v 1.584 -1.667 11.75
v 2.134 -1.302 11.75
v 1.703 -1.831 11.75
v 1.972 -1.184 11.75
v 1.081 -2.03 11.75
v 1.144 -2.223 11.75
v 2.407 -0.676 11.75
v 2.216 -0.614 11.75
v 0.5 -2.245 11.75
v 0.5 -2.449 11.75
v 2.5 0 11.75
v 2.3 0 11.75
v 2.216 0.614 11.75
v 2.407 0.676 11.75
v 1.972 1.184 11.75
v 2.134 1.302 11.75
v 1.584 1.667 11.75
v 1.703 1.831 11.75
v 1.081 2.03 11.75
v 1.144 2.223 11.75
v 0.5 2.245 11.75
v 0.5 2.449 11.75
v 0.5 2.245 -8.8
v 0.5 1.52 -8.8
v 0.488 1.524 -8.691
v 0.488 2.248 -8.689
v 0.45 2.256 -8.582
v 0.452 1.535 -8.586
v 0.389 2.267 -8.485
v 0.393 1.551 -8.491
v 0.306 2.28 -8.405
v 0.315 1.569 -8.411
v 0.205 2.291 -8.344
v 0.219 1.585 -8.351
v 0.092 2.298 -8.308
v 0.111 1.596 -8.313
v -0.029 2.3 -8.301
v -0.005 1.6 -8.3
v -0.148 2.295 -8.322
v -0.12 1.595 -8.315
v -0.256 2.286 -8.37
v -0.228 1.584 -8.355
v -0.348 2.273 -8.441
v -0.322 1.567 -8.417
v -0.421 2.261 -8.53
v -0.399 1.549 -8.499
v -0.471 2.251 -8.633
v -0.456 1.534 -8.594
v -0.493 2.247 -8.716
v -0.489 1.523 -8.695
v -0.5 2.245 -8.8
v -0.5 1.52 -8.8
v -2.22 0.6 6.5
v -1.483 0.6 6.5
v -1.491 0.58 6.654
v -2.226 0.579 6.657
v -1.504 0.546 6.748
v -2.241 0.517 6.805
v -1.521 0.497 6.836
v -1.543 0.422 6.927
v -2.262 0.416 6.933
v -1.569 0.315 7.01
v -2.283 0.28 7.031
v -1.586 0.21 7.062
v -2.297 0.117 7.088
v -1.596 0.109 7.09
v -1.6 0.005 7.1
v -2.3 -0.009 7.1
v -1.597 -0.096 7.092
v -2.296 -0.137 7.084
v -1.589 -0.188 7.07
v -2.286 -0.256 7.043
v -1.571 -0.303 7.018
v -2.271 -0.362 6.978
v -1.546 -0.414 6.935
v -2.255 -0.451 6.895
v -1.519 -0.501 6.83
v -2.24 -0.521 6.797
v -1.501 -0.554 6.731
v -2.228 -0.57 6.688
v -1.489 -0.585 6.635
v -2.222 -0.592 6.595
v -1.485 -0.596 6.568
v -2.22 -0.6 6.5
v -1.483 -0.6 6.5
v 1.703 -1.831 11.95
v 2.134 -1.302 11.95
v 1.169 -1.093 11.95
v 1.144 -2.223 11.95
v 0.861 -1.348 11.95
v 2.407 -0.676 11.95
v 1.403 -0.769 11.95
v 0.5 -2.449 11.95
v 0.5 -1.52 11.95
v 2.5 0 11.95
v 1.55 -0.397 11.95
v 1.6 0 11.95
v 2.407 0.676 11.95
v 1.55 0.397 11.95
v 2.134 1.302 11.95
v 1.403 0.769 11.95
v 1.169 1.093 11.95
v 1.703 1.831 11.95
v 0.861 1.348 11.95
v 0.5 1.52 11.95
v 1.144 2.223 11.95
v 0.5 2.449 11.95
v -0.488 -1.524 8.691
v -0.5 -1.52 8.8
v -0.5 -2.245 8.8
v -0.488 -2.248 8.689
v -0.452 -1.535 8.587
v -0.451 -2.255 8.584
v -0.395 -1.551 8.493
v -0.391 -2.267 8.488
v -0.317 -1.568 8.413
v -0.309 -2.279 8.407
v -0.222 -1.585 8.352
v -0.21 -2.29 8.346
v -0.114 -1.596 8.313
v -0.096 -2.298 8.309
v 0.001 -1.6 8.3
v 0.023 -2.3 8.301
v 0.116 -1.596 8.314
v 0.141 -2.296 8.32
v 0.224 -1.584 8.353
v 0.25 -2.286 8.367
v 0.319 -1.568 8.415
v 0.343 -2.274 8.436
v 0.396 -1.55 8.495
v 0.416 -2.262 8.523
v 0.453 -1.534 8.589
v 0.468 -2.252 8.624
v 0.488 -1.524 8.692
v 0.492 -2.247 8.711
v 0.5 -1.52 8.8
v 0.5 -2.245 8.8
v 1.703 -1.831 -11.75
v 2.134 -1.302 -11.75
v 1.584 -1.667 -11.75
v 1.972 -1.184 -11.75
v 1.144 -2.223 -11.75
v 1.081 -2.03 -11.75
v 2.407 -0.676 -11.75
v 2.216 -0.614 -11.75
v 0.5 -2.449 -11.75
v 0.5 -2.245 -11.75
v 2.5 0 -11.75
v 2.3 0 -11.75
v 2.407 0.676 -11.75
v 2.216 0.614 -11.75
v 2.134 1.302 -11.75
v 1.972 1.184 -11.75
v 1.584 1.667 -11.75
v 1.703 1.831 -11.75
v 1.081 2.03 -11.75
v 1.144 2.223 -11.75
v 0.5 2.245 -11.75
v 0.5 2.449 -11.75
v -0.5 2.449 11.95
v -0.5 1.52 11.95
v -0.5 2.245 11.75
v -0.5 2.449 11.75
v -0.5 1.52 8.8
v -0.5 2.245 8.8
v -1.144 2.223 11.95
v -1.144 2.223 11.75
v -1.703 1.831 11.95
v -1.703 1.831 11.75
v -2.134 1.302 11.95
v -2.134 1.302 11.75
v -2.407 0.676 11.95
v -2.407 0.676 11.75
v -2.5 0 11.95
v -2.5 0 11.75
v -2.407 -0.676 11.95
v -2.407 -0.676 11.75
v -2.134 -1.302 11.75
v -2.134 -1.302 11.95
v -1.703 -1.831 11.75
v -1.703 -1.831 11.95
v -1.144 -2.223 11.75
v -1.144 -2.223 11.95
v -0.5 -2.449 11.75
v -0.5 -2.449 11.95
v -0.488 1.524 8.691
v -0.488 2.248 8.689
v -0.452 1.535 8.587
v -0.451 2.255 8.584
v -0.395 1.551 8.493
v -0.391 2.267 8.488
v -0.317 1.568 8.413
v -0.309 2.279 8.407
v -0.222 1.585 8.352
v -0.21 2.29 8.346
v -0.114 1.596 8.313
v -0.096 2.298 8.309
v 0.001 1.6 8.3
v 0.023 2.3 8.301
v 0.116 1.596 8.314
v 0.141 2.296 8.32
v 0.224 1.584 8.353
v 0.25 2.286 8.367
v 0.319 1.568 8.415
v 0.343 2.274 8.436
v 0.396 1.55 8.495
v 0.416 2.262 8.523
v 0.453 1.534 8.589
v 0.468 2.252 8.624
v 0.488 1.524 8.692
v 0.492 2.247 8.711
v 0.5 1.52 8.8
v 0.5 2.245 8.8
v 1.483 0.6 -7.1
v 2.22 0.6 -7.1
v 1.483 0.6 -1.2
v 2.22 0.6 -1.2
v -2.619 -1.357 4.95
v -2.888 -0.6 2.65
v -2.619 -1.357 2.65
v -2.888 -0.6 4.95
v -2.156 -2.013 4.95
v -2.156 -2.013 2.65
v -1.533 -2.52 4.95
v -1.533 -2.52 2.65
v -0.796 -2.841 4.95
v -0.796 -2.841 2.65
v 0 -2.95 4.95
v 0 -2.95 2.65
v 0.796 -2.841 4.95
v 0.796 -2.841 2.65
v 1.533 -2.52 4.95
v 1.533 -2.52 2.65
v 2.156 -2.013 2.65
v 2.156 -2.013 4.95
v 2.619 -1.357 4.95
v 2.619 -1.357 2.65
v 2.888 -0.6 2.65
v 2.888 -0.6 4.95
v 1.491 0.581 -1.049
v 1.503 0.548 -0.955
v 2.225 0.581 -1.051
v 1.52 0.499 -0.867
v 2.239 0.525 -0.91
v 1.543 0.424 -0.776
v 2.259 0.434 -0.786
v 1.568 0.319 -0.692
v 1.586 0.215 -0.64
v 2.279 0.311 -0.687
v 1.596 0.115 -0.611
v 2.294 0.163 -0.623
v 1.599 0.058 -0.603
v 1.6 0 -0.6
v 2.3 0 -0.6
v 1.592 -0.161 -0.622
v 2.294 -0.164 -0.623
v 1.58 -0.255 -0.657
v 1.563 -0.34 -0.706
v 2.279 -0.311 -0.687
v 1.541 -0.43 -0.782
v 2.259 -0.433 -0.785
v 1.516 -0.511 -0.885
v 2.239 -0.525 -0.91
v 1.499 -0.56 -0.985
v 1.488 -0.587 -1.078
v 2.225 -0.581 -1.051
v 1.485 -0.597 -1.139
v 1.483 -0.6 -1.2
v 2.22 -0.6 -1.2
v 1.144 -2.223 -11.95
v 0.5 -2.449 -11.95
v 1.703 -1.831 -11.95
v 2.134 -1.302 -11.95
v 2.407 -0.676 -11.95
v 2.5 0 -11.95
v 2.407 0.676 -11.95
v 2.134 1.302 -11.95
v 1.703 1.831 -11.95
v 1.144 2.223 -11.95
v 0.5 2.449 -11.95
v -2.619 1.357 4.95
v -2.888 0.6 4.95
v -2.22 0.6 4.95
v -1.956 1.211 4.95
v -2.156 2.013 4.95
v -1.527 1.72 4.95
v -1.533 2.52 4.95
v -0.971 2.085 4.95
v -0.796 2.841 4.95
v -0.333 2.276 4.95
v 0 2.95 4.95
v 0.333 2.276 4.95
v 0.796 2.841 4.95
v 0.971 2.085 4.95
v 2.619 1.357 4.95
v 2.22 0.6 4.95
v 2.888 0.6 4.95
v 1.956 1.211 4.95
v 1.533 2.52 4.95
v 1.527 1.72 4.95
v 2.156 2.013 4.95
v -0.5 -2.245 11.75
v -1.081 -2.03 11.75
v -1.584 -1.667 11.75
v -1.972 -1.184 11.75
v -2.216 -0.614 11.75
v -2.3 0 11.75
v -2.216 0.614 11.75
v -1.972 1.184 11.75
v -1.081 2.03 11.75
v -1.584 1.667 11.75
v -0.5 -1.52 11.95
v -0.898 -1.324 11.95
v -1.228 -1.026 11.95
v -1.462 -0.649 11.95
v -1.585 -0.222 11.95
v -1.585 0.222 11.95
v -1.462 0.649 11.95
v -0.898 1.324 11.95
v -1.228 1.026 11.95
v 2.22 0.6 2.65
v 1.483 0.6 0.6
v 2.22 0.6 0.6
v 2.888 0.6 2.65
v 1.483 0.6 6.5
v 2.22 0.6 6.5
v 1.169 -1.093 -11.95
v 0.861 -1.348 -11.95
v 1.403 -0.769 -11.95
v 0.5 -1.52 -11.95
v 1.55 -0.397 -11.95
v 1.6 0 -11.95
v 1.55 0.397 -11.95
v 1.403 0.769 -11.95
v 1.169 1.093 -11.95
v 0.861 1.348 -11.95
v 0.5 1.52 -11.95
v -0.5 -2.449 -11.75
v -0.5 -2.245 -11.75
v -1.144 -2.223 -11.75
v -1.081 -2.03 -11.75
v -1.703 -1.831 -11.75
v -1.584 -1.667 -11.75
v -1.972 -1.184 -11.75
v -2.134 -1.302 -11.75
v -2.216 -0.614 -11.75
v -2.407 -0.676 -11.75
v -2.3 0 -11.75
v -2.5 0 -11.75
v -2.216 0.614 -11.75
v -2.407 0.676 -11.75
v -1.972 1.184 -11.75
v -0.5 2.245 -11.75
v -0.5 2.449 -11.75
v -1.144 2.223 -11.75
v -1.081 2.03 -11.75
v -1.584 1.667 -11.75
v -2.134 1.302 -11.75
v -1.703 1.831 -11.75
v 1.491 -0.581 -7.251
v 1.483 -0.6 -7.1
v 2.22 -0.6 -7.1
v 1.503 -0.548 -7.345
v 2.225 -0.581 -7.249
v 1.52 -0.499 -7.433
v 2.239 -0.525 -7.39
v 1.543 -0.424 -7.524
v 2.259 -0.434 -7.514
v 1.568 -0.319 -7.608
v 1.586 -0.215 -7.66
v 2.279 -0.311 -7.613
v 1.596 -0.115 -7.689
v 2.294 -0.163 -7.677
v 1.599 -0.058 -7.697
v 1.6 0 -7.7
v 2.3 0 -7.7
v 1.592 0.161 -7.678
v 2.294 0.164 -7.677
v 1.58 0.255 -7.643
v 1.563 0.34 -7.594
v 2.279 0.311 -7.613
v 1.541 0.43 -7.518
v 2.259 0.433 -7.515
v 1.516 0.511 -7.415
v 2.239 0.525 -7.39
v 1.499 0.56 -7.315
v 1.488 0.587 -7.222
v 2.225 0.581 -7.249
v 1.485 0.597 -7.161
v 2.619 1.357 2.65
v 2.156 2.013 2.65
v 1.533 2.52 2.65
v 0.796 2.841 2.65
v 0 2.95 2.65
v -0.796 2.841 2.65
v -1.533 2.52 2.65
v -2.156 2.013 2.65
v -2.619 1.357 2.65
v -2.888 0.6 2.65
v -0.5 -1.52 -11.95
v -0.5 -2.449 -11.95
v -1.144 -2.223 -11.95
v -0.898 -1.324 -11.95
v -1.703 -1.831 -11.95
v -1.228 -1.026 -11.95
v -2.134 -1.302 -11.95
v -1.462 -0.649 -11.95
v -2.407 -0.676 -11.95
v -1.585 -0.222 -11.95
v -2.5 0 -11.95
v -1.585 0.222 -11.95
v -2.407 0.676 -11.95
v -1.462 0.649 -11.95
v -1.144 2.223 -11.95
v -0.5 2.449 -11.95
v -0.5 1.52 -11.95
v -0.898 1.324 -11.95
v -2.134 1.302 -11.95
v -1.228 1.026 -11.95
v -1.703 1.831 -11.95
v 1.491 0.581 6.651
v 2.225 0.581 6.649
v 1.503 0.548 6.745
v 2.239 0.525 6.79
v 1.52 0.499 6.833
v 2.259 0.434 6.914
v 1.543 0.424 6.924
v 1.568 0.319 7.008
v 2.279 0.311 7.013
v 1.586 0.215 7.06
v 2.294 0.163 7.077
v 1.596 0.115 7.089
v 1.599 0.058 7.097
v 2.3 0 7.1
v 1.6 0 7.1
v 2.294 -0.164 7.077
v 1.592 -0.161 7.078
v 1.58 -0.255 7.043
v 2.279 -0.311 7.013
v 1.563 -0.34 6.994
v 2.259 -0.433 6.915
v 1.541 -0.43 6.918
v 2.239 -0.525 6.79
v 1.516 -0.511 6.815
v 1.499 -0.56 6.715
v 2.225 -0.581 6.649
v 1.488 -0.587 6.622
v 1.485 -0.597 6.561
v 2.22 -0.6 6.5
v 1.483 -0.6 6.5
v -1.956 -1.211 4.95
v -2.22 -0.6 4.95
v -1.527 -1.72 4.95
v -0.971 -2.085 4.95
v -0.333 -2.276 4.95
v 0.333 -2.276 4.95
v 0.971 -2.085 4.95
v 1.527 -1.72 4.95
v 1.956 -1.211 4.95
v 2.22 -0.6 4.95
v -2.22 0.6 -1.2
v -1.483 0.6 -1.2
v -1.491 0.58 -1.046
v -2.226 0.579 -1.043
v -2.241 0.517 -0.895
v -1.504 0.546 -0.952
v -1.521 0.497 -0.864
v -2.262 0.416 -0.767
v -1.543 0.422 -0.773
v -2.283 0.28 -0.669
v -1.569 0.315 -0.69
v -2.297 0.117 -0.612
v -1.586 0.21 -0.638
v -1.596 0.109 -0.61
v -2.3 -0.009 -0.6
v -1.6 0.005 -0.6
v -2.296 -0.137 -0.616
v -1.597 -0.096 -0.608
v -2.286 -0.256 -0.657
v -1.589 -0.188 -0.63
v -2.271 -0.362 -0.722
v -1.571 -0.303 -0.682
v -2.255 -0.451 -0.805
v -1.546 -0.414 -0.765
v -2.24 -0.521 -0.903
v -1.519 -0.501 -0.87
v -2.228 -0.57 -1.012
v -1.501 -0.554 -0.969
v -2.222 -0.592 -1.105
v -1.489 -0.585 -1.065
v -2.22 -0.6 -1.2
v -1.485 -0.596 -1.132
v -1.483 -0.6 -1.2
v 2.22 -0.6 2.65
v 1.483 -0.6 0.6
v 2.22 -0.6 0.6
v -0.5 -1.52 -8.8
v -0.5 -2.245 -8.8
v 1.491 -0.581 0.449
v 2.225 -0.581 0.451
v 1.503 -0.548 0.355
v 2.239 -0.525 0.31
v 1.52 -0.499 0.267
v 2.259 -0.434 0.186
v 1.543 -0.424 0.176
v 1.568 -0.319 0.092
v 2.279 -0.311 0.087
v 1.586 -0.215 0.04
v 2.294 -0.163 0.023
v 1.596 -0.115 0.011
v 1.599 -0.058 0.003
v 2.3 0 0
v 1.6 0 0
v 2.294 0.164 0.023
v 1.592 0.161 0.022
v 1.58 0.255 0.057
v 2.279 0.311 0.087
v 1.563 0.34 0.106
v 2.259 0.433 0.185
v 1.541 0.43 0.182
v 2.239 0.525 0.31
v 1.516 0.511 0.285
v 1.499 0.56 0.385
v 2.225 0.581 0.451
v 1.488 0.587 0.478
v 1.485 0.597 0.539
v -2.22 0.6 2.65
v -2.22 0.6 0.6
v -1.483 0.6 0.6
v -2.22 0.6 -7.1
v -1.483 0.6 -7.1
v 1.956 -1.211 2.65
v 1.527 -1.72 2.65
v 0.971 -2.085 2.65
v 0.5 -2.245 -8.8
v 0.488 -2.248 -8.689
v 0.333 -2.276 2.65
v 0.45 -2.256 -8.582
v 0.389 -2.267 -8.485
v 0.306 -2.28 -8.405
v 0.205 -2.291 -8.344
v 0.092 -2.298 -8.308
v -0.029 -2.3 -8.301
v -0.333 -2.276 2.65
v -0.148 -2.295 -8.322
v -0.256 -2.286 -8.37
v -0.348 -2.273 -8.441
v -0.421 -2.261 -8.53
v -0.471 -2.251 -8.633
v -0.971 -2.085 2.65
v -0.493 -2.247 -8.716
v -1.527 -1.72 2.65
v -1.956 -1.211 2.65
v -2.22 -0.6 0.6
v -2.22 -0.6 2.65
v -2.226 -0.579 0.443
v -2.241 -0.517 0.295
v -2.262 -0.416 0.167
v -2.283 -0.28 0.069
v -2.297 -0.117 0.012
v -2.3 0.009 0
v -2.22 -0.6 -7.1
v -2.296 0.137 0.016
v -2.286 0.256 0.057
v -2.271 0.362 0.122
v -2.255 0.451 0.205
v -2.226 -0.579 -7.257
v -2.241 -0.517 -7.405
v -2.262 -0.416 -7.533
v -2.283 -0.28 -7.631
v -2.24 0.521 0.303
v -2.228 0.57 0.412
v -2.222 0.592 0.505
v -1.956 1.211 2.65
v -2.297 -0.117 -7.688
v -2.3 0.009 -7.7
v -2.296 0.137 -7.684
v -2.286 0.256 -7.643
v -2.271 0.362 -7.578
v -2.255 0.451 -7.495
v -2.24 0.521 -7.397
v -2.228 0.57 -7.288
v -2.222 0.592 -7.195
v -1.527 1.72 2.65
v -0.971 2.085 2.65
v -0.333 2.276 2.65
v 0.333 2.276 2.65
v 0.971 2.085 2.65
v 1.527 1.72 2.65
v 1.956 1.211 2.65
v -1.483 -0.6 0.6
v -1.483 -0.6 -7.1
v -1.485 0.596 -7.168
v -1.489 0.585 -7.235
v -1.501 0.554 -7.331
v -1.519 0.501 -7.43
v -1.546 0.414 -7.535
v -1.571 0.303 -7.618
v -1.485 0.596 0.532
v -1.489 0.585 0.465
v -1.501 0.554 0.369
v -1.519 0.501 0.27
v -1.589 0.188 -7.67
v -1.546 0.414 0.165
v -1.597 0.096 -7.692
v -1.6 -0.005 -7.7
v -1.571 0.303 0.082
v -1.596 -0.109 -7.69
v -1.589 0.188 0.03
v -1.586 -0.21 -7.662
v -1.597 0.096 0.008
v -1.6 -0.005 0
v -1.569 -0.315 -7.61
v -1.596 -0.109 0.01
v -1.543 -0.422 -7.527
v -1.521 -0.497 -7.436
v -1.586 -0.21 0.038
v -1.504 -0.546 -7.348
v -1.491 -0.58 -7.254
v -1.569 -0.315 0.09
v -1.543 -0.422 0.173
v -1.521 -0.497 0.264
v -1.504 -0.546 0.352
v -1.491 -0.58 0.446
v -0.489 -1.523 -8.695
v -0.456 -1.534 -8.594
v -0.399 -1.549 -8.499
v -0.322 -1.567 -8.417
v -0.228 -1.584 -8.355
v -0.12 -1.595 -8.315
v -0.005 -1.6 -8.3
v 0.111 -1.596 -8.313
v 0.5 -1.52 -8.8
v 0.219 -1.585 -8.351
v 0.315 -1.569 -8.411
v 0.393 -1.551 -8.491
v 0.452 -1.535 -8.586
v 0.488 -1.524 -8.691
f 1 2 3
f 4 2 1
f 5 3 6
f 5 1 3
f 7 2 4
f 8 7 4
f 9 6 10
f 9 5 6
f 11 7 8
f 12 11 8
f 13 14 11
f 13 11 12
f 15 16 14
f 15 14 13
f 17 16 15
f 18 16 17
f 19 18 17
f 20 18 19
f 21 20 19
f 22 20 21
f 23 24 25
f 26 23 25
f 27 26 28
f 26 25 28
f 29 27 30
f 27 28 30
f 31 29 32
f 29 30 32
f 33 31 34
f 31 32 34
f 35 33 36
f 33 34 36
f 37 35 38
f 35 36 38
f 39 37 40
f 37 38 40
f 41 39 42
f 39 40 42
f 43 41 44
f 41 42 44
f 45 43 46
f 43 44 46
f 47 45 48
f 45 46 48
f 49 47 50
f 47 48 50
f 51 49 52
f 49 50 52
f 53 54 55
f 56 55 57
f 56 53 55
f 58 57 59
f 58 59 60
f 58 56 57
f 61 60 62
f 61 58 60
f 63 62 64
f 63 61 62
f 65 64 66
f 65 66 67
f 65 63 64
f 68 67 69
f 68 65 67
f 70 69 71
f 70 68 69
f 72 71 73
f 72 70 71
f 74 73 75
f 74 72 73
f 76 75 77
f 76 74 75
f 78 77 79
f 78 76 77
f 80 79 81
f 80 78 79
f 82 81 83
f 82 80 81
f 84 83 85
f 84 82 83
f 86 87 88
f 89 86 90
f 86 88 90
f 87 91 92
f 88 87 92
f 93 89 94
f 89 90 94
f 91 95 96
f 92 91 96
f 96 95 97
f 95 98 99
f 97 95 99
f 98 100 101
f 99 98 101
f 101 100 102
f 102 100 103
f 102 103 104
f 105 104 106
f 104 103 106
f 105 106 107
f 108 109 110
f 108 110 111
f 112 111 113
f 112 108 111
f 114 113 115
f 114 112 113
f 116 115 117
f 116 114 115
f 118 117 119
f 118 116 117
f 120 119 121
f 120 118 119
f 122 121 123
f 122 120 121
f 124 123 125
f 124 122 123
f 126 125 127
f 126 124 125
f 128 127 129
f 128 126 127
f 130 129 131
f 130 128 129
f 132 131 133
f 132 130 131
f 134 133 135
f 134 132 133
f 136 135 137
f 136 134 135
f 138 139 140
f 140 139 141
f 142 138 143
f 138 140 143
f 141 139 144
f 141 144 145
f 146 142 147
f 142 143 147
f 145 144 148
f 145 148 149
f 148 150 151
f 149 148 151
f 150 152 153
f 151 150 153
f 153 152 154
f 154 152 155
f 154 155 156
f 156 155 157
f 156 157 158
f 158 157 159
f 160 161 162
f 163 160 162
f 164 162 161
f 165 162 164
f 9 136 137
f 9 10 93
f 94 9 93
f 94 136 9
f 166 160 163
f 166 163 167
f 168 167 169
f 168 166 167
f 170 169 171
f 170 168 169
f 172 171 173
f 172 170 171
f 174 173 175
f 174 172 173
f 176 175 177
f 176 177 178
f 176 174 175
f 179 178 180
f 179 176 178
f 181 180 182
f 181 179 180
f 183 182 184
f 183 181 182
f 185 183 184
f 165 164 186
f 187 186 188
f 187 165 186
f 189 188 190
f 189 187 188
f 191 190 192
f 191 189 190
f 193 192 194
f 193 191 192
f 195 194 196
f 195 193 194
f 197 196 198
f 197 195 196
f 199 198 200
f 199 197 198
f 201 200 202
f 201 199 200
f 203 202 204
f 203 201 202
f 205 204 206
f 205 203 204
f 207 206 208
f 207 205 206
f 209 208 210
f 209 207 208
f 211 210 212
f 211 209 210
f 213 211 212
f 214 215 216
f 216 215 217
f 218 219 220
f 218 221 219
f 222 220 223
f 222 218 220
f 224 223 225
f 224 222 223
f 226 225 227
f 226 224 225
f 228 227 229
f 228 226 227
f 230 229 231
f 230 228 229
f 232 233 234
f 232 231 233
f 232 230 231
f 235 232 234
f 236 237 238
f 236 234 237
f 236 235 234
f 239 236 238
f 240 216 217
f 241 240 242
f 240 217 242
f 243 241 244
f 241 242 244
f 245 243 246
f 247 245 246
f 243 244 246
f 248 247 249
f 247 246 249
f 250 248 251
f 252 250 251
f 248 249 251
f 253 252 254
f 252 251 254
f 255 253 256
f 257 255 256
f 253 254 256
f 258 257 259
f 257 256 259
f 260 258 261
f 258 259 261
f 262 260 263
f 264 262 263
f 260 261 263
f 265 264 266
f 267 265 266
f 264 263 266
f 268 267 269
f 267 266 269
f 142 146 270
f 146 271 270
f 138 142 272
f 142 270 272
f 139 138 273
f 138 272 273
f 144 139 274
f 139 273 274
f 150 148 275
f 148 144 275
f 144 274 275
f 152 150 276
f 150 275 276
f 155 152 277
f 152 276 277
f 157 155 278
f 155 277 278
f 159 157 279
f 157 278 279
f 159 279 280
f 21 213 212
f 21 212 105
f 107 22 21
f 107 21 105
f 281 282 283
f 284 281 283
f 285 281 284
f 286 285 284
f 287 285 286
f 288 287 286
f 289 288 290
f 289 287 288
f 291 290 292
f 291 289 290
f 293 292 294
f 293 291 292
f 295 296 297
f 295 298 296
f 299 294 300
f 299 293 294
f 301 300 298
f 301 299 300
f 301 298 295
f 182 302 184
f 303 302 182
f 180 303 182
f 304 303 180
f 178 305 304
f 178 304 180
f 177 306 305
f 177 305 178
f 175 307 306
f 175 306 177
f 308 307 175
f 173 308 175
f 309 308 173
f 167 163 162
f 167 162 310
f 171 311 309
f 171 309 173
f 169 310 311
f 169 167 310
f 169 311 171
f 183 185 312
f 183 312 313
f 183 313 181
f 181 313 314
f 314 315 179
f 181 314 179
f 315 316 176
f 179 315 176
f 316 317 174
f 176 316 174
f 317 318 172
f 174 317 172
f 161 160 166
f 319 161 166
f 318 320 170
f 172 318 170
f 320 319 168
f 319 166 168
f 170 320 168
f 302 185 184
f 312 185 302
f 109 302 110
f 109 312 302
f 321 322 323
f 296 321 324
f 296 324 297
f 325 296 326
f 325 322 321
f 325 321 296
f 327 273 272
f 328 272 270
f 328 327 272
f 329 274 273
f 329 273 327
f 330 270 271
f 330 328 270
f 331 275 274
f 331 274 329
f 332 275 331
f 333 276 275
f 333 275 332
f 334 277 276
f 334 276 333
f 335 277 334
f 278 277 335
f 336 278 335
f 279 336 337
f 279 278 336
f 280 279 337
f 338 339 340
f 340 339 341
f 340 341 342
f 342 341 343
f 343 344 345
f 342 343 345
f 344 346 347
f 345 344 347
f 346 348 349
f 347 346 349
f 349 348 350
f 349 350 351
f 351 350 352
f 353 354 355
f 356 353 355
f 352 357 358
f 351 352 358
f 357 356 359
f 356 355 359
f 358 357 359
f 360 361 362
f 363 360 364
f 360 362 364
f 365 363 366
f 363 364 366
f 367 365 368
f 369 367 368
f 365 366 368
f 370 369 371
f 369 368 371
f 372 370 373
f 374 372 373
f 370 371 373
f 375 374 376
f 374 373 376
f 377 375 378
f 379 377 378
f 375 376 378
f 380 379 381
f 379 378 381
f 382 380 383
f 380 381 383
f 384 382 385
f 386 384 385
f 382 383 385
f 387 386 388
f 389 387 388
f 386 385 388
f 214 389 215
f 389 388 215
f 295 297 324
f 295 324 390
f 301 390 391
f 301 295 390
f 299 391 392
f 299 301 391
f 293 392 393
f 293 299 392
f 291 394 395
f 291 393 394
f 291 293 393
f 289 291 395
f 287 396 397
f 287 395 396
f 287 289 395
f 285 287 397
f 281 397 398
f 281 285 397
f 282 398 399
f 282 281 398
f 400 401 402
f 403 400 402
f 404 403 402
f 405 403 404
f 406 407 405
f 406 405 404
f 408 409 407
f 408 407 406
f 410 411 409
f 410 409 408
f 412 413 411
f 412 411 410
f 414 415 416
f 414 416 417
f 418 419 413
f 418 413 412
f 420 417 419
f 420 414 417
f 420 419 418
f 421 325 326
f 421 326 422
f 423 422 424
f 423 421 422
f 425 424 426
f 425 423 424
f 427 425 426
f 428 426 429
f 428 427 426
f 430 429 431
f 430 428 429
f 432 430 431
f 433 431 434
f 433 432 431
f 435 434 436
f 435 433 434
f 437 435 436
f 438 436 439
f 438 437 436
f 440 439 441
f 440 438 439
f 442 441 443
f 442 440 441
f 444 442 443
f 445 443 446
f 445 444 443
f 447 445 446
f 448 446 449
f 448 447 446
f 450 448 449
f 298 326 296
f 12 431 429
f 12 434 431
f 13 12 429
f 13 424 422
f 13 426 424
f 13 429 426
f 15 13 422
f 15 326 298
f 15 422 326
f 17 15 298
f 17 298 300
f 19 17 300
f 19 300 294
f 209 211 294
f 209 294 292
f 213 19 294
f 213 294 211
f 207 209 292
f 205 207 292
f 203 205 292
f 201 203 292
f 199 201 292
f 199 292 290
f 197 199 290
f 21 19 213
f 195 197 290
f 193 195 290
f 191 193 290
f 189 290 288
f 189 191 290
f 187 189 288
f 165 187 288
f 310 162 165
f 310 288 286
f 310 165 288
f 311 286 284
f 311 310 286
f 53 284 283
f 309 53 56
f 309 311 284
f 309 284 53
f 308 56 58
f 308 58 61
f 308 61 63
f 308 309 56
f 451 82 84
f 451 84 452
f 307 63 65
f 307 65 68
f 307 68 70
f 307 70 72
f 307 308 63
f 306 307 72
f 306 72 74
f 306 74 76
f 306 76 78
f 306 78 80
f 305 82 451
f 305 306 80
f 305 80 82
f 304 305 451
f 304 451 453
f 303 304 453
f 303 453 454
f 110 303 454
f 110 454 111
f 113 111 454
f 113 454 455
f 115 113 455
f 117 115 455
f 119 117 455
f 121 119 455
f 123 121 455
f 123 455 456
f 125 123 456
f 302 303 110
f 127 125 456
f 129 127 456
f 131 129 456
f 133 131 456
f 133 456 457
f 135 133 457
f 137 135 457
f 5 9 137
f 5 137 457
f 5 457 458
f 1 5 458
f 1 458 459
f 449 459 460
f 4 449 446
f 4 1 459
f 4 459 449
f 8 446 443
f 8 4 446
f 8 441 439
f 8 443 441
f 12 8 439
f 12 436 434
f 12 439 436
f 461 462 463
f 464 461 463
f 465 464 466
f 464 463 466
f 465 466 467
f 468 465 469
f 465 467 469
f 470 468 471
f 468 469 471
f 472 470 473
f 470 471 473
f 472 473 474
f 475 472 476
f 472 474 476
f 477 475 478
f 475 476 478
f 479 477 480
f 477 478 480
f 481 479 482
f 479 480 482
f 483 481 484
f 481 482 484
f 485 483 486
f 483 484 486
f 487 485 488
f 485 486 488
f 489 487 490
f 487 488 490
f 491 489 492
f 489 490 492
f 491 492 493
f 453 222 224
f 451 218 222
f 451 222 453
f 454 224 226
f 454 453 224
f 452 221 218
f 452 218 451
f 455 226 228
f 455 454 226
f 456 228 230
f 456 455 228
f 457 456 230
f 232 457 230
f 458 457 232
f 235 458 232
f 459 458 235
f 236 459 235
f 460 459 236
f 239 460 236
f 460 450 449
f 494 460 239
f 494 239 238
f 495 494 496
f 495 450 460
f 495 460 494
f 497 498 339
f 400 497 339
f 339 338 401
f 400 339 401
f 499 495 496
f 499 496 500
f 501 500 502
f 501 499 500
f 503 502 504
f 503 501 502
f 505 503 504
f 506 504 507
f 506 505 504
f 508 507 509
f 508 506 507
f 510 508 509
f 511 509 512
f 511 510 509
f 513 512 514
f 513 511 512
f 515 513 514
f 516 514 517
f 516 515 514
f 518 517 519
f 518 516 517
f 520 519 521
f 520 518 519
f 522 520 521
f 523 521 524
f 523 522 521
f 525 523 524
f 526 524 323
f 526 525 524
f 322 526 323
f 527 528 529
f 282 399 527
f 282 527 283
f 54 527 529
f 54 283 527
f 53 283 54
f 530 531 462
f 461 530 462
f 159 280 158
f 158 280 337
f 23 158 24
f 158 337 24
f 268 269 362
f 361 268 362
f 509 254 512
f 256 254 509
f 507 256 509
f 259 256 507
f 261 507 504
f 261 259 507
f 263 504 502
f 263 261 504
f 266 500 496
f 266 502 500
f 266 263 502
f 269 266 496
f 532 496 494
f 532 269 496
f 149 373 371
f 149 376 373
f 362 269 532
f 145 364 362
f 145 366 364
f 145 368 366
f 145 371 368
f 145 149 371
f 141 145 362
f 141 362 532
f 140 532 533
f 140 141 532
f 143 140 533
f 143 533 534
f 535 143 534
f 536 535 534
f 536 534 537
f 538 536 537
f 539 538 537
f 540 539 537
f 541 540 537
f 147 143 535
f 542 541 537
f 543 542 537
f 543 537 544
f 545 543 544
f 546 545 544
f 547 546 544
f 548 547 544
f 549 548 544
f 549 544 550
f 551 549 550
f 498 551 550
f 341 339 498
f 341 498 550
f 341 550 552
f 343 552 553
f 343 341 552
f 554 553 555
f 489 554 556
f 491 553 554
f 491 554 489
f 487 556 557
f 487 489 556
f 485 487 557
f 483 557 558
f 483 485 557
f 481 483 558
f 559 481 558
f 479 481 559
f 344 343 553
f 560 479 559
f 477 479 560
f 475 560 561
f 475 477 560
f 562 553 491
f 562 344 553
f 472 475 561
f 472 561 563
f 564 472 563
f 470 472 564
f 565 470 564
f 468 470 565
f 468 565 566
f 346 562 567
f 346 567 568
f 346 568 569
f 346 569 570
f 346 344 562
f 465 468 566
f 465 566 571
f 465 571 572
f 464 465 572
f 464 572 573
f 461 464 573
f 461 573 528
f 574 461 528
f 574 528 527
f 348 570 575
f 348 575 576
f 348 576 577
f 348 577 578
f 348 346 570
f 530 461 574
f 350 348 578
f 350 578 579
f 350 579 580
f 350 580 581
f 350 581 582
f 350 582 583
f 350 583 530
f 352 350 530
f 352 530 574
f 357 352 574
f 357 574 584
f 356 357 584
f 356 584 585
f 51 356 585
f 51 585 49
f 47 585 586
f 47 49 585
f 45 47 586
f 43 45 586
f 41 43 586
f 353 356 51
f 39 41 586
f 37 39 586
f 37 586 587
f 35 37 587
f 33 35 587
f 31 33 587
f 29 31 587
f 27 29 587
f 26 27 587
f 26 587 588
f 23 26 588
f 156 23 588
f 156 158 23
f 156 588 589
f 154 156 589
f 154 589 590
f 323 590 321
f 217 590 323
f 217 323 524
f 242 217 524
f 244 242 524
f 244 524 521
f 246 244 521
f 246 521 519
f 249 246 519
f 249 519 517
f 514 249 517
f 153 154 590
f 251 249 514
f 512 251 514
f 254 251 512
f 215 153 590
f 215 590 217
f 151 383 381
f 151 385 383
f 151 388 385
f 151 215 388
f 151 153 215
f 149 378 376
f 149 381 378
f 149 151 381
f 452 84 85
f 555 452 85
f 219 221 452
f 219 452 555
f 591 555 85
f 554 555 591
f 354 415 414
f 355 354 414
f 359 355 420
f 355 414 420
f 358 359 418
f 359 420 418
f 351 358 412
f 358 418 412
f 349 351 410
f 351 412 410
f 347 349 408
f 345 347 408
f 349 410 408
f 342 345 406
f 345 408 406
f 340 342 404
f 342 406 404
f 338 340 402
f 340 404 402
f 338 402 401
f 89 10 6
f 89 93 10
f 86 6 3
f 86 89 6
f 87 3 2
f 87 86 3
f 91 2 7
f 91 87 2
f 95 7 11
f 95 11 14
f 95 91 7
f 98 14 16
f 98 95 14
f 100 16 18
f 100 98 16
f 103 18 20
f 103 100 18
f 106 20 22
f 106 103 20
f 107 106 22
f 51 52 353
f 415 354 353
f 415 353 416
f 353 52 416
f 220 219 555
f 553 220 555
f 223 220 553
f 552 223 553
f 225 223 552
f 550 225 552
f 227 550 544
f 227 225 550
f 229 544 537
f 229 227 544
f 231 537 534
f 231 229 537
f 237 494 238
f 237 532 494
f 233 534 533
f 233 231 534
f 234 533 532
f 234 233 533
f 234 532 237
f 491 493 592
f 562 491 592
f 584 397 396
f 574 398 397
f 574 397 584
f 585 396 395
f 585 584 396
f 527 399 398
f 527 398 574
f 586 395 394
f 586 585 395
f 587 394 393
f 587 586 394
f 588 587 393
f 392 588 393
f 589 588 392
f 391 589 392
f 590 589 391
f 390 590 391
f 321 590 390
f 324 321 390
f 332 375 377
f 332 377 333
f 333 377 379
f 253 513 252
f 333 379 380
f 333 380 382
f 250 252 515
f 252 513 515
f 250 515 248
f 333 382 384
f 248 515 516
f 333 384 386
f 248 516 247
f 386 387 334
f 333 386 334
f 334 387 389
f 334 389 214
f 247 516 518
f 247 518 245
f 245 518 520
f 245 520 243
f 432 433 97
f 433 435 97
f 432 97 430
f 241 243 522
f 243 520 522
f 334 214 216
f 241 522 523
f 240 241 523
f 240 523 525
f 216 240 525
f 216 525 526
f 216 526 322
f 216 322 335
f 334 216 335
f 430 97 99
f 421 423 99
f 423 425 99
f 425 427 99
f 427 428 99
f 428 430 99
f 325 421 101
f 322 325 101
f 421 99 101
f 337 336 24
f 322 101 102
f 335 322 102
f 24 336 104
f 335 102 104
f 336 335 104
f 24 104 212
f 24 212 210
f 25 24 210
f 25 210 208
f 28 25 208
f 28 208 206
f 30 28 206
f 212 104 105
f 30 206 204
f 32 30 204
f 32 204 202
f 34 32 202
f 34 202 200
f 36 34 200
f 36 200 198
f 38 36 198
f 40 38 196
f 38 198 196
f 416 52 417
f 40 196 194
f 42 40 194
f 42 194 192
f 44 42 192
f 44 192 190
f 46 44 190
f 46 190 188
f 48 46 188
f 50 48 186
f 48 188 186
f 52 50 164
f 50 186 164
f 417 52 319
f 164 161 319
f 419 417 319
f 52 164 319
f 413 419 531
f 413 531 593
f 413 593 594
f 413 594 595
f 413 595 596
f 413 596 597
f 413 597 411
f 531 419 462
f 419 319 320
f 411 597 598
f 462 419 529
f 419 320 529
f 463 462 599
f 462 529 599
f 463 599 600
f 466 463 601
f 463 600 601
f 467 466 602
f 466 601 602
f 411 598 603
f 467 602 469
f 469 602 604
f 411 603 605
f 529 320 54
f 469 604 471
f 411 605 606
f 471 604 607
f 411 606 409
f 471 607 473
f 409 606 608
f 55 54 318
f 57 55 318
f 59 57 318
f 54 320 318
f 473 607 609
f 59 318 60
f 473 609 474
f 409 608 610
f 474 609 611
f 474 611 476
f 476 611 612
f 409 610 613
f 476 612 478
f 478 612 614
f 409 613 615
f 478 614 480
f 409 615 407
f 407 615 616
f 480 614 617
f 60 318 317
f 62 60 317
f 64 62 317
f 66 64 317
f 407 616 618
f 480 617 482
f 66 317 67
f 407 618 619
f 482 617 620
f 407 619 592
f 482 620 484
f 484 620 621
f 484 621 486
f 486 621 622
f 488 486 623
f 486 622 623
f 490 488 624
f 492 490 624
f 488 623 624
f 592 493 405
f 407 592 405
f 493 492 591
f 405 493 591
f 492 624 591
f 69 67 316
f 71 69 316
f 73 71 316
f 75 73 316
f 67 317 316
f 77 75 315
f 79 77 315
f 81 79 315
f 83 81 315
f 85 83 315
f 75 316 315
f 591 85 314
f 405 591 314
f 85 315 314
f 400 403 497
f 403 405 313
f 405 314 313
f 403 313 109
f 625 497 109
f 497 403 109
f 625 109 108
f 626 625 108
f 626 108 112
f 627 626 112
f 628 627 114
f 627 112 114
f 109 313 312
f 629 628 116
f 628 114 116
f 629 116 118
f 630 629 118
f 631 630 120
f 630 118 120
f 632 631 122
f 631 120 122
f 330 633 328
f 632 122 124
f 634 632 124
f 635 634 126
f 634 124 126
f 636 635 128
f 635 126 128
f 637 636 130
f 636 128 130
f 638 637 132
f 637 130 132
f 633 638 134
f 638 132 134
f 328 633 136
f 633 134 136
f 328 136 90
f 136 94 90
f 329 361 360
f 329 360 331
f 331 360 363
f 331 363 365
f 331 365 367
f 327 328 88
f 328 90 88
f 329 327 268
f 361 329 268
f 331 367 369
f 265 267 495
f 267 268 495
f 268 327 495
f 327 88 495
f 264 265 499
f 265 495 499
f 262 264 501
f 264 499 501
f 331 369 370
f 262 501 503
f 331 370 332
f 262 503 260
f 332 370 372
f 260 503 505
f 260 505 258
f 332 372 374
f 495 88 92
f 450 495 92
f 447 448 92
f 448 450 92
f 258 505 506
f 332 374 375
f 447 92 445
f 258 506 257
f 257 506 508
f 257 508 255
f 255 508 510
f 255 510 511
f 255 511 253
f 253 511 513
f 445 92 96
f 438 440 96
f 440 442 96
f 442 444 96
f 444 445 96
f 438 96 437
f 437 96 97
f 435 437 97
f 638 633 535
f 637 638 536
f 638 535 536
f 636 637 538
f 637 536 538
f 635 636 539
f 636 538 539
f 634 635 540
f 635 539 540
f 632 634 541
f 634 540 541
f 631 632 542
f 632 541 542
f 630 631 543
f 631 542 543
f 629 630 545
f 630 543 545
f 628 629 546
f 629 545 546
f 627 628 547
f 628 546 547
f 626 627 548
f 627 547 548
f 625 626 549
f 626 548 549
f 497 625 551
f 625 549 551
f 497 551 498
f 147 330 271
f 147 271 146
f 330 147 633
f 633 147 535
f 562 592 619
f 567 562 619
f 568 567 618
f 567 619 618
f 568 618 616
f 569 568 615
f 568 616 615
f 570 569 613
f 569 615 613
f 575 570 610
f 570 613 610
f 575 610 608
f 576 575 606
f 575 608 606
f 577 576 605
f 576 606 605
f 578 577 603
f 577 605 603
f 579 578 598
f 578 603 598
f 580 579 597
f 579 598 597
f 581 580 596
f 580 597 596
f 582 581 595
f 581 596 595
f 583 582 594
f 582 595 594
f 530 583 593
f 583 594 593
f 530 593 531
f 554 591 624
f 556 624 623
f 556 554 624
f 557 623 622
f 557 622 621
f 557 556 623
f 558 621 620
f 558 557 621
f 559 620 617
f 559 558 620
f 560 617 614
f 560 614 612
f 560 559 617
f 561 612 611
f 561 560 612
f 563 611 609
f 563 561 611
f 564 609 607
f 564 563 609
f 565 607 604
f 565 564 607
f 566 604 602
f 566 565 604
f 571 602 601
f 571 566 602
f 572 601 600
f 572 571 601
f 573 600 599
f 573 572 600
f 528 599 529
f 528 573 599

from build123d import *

# Parameters (mm, degrees)
F0_R      = 2.95
F1_DEPTH  = 11.95
F2_R      = 2.95
F2_R_2    = 2.3
F3_DEPTH  = 7
F4_R      = 2.95
F4_R_2    = 2.3
F5_DEPTH  = 14.6
F6_R      = 1.6
F7_DEPTH  = 23.901
F9_DEPTH  = 12.5
F10_W     = 0.2
F10_H     = 0.2
F12_DEPTH = 12.5
F13_DEPTH = 12.5
F15_DEPTH = 12.5


# Not quite as in the source:
# - a pattern or mirror of a feature is missing from the dataset's text; its kind, count and spacing are read off the source's solid


with BuildPart() as f1:
    # F0 (on Top) → F1 (new body, symmetric)
    with BuildSketch(Plane.XY):
        Circle(F0_R)
    extrude(amount=F1_DEPTH, both=True)

    # F2 (on face) → F3 (cut)
    with BuildSketch(Plane.XY.offset(11.95)):
        Circle(F2_R)
        Circle(F2_R_2, mode=Mode.SUBTRACT)
    extrude(amount=-F3_DEPTH, mode=Mode.SUBTRACT)

    # F4 (on face) → F5 (cut)
    with BuildSketch(Plane(origin=(0, 0, -11.95), x_dir=(1, 0, 0), z_dir=(0, 0, -1))):
        Circle(F4_R)
        Circle(F4_R_2, mode=Mode.SUBTRACT)
    extrude(amount=-F5_DEPTH, mode=Mode.SUBTRACT)

    # F6 (on face) → F7 (cut, through all)
    with BuildSketch(Plane.XY.offset(11.95)):
        Circle(F6_R)
    extrude(amount=-F7_DEPTH, mode=Mode.SUBTRACT)

    # F8 (on Front) → F9 (cut, symmetric)
    with BuildSketch(Plane.XZ):
        with BuildLine():
            ThreePointArc((0.5, 8.8), (0, 9.3), (-0.5, 8.8))
            Line((-0.5, 8.8), (0.5, 8.8))
        make_face()
        with BuildLine():
            Line((-0.5, 11.95), (-0.5, 8.8))
            ThreePointArc((-0.5, 8.8), (0, 9.3), (0.5, 8.8))
            Line((0.5, 8.8), (0.5, 11.95))
            Line((0.5, 11.95), (-0.5, 11.95))
        make_face()
        with BuildLine():
            Line((0.5, 8.8), (-0.5, 8.8))
            ThreePointArc((-0.5, 8.8), (0, 8.3), (0.5, 8.8))
        make_face()
        with BuildLine():
            Line((-0.5, -8.8), (-0.5, -11.95))
            Line((-0.5, -11.95), (0.5, -11.95))
            Line((0.5, -11.95), (0.5, -8.8))
            ThreePointArc((0.5, -8.8), (0, -9.3), (-0.5, -8.8))
        make_face()
        with BuildLine():
            ThreePointArc((0.5, -8.8), (0, -8.3), (-0.5, -8.8))
            Line((-0.5, -8.8), (0.5, -8.8))
        make_face()
        with BuildLine():
            Line((0.5, -8.8), (-0.5, -8.8))
            ThreePointArc((-0.5, -8.8), (0, -9.3), (0.5, -8.8))
        make_face()
    extrude(amount=F9_DEPTH, both=True, mode=Mode.SUBTRACT)

    # F10 (on Front) → F11 (revolve)
    with BuildSketch(Plane.XZ):
        with Locations((2.4, 11.85)):
            Rectangle(F10_W, F10_H)
    f11 = revolve(axis=Axis((0, 0, 11.95), (0, 0, 1)))

    # F11_copies: F11 across plane
    add(f11.mirror(Plane(origin=(0, 0, 0), x_dir=(-1, 0, 0), z_dir=(0, 0, -1))))

    # F8 (on Front) → F12 (cut, symmetric)
    with BuildSketch(Plane.XZ):
        with BuildLine():
            ThreePointArc((0.5, 8.8), (0, 9.3), (-0.5, 8.8))
            Line((-0.5, 8.8), (0.5, 8.8))
        make_face()
        with BuildLine():
            Line((-0.5, 11.95), (-0.5, 8.8))
            ThreePointArc((-0.5, 8.8), (0, 9.3), (0.5, 8.8))
            Line((0.5, 8.8), (0.5, 11.95))
            Line((0.5, 11.95), (-0.5, 11.95))
        make_face()
        with BuildLine():
            Line((0.5, 8.8), (-0.5, 8.8))
            ThreePointArc((-0.5, 8.8), (0, 8.3), (0.5, 8.8))
        make_face()
        with BuildLine():
            Line((-0.5, -8.8), (-0.5, -11.95))
            Line((-0.5, -11.95), (0.5, -11.95))
            Line((0.5, -11.95), (0.5, -8.8))
            ThreePointArc((0.5, -8.8), (0, -9.3), (-0.5, -8.8))
        make_face()
        with BuildLine():
            ThreePointArc((0.5, -8.8), (0, -8.3), (-0.5, -8.8))
            Line((-0.5, -8.8), (0.5, -8.8))
        make_face()
        with BuildLine():
            Line((0.5, -8.8), (-0.5, -8.8))
            ThreePointArc((-0.5, -8.8), (0, -9.3), (0.5, -8.8))
        make_face()
    extrude(amount=F12_DEPTH, both=True, mode=Mode.SUBTRACT)

    # F8 (on Front) → F13 (cut, symmetric)
    with BuildSketch(Plane.XZ):
        with BuildLine():
            ThreePointArc((0.5, 8.8), (0, 9.3), (-0.5, 8.8))
            Line((-0.5, 8.8), (0.5, 8.8))
        make_face()
        with BuildLine():
            Line((-0.5, 11.95), (-0.5, 8.8))
            ThreePointArc((-0.5, 8.8), (0, 9.3), (0.5, 8.8))
            Line((0.5, 8.8), (0.5, 11.95))
            Line((0.5, 11.95), (-0.5, 11.95))
        make_face()
        with BuildLine():
            Line((0.5, 8.8), (-0.5, 8.8))
            ThreePointArc((-0.5, 8.8), (0, 8.3), (0.5, 8.8))
        make_face()
        with BuildLine():
            Line((-0.5, -8.8), (-0.5, -11.95))
            Line((-0.5, -11.95), (0.5, -11.95))
            Line((0.5, -11.95), (0.5, -8.8))
            ThreePointArc((0.5, -8.8), (0, -9.3), (-0.5, -8.8))
        make_face()
        with BuildLine():
            ThreePointArc((0.5, -8.8), (0, -8.3), (-0.5, -8.8))
            Line((-0.5, -8.8), (0.5, -8.8))
        make_face()
        with BuildLine():
            Line((0.5, -8.8), (-0.5, -8.8))
            ThreePointArc((-0.5, -8.8), (0, -9.3), (0.5, -8.8))
        make_face()
    extrude(amount=F13_DEPTH, both=True, mode=Mode.SUBTRACT)

    # F14 (on Right) → F15 (cut, symmetric)
    with BuildSketch(Plane.YZ):
        with BuildLine():
            ThreePointArc((-0.6, 0.6), (0, 0), (0.6, 0.6))
            Line((0.6, 0.6), (-0.6, 0.6))
        make_face()
        with BuildLine():
            ThreePointArc((-0.6, 0.6), (0, 1.2), (0.6, 0.6))
            Line((0.6, 0.6), (0.6, 6.5))
            ThreePointArc((0.6, 6.5), (0, 5.9), (-0.6, 6.5))
            Line((-0.6, 6.5), (-0.6, 0.6))
        make_face()
        with BuildLine():
            Line((-0.6, 0.6), (0.6, 0.6))
            ThreePointArc((0.6, 0.6), (0, 1.2), (-0.6, 0.6))
        make_face()
        with BuildLine():
            ThreePointArc((-0.6, 6.5), (0, 5.9), (0.6, 6.5))
            Line((0.6, 6.5), (-0.6, 6.5))
        make_face()
        with BuildLine():
            Line((-0.6, 6.5), (0.6, 6.5))
            ThreePointArc((0.6, 6.5), (0, 7.1), (-0.6, 6.5))
        make_face()
        with BuildLine():
            ThreePointArc((-0.6, -7.1), (0, -7.7), (0.6, -7.1))
            Line((0.6, -7.1), (-0.6, -7.1))
        make_face()
        with BuildLine():
            ThreePointArc((-0.6, -7.1), (0, -6.5), (0.6, -7.1))
            Line((0.6, -7.1), (0.6, -1.2))
            ThreePointArc((0.6, -1.2), (0, -1.8), (-0.6, -1.2))
            Line((-0.6, -1.2), (-0.6, -7.1))
        make_face()
        with BuildLine():
            Line((-0.6, -7.1), (0.6, -7.1))
            ThreePointArc((0.6, -7.1), (0, -6.5), (-0.6, -7.1))
        make_face()
        with BuildLine():
            ThreePointArc((-0.6, -1.2), (0, -1.8), (0.6, -1.2))
            Line((0.6, -1.2), (-0.6, -1.2))
        make_face()
        with BuildLine():
            Line((-0.6, -1.2), (0.6, -1.2))
            ThreePointArc((0.6, -1.2), (0, -0.6), (-0.6, -1.2))
        make_face()
    extrude(amount=F15_DEPTH, both=True, mode=Mode.SUBTRACT)


solid = f1.part
